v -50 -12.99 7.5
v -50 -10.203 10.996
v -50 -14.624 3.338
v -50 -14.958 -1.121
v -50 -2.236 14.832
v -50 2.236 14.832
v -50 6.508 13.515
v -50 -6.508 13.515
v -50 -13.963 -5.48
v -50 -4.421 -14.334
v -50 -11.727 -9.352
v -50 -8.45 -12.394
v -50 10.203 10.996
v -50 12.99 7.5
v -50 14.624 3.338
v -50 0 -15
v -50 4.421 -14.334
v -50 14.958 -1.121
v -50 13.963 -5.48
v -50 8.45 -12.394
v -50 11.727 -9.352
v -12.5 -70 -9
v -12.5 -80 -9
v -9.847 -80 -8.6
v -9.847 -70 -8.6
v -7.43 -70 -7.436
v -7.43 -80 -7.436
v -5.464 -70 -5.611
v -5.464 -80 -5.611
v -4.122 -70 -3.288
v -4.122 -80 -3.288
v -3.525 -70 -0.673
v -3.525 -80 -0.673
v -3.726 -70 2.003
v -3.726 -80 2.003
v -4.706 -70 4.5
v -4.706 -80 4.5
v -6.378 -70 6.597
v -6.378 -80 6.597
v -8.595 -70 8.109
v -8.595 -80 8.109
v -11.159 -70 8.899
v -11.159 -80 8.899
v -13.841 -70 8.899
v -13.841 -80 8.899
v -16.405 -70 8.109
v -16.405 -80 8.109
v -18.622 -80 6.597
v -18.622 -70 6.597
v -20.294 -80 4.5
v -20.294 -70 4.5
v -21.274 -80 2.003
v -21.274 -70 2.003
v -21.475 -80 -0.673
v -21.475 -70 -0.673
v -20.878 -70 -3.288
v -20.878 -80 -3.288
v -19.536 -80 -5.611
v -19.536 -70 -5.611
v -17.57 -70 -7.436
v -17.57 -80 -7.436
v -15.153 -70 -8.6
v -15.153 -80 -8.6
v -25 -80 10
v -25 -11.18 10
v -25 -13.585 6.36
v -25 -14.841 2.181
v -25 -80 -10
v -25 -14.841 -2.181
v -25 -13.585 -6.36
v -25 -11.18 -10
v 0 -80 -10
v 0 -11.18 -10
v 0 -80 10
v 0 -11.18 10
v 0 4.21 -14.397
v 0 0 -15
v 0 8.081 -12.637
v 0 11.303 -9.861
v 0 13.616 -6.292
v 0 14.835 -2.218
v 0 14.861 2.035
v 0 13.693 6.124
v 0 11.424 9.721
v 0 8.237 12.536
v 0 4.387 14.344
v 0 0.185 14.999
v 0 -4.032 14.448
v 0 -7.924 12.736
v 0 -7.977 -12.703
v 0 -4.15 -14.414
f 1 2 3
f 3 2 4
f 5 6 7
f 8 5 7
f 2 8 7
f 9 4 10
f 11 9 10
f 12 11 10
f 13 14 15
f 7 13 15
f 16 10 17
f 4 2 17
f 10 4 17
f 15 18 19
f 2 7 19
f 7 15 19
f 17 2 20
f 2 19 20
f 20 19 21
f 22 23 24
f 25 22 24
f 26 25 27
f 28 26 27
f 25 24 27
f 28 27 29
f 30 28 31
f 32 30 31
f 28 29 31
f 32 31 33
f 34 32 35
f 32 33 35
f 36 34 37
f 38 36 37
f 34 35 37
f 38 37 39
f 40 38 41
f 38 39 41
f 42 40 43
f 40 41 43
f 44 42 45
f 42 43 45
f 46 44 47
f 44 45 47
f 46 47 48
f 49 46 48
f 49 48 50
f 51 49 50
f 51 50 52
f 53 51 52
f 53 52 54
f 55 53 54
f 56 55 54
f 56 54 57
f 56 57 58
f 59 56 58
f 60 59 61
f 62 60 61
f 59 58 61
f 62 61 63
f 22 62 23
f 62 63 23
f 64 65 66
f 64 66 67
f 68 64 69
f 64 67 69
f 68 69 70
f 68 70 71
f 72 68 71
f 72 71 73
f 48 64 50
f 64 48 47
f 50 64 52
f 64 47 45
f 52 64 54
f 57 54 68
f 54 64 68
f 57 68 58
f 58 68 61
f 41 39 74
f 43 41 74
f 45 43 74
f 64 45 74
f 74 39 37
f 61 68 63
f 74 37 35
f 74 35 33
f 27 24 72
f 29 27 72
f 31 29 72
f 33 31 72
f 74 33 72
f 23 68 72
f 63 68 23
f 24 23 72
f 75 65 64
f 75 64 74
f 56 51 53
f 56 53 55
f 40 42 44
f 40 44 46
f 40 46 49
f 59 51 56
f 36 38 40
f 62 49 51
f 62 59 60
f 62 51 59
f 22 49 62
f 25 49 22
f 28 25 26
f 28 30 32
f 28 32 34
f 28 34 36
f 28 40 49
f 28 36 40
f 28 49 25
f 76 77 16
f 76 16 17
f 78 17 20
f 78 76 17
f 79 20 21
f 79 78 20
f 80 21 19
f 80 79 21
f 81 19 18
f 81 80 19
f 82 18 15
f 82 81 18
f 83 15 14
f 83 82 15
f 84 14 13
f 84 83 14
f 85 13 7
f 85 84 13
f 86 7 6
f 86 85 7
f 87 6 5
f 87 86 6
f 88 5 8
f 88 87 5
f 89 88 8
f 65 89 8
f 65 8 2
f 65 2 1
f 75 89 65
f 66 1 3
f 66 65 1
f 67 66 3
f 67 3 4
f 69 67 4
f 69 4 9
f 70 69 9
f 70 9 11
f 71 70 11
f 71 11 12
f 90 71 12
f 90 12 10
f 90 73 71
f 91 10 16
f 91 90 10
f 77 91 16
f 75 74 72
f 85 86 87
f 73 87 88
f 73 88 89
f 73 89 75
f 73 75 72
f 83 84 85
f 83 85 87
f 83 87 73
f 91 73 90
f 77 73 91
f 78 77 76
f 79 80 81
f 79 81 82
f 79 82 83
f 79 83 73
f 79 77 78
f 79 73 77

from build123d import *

# Parameters (mm, degrees)
SKETCH1_R           = 15
BOSS_EXTRUDE1_DEPTH = 50
SKETCH2_W           = 25
SKETCH2_H           = 20
BOSS_EXTRUDE2_DEPTH = 80
SKETCH3_R           = 9
CUT_EXTRUDE2_DEPTH  = 10


with BuildPart() as part:
    # Sketch1 → Boss-Extrude1 (new body)
    with BuildSketch(Plane(origin=(0, 0, 0), x_dir=(0, 0, -1), z_dir=(1, 0, 0))):
        Circle(SKETCH1_R)
    extrude(amount=-BOSS_EXTRUDE1_DEPTH)

    # Sketch2 → Boss-Extrude2 (add)
    with BuildSketch(Plane(origin=(0, 0, 0), x_dir=(1, 0, 0), z_dir=(0, 1, 0))):
        with Locations((-12.5, 0)):
            Rectangle(SKETCH2_W, SKETCH2_H)
    extrude(amount=-BOSS_EXTRUDE2_DEPTH)

    # Sketch3 → Cut-Extrude2 (cut)
    with BuildSketch(Plane.XZ.offset(80)):
        with Locations(Location((-12.5, 0, 0), (0, 0, 270))):
            Circle(SKETCH3_R)
    extrude(amount=-CUT_EXTRUDE2_DEPTH, mode=Mode.SUBTRACT)


solid = part.part
